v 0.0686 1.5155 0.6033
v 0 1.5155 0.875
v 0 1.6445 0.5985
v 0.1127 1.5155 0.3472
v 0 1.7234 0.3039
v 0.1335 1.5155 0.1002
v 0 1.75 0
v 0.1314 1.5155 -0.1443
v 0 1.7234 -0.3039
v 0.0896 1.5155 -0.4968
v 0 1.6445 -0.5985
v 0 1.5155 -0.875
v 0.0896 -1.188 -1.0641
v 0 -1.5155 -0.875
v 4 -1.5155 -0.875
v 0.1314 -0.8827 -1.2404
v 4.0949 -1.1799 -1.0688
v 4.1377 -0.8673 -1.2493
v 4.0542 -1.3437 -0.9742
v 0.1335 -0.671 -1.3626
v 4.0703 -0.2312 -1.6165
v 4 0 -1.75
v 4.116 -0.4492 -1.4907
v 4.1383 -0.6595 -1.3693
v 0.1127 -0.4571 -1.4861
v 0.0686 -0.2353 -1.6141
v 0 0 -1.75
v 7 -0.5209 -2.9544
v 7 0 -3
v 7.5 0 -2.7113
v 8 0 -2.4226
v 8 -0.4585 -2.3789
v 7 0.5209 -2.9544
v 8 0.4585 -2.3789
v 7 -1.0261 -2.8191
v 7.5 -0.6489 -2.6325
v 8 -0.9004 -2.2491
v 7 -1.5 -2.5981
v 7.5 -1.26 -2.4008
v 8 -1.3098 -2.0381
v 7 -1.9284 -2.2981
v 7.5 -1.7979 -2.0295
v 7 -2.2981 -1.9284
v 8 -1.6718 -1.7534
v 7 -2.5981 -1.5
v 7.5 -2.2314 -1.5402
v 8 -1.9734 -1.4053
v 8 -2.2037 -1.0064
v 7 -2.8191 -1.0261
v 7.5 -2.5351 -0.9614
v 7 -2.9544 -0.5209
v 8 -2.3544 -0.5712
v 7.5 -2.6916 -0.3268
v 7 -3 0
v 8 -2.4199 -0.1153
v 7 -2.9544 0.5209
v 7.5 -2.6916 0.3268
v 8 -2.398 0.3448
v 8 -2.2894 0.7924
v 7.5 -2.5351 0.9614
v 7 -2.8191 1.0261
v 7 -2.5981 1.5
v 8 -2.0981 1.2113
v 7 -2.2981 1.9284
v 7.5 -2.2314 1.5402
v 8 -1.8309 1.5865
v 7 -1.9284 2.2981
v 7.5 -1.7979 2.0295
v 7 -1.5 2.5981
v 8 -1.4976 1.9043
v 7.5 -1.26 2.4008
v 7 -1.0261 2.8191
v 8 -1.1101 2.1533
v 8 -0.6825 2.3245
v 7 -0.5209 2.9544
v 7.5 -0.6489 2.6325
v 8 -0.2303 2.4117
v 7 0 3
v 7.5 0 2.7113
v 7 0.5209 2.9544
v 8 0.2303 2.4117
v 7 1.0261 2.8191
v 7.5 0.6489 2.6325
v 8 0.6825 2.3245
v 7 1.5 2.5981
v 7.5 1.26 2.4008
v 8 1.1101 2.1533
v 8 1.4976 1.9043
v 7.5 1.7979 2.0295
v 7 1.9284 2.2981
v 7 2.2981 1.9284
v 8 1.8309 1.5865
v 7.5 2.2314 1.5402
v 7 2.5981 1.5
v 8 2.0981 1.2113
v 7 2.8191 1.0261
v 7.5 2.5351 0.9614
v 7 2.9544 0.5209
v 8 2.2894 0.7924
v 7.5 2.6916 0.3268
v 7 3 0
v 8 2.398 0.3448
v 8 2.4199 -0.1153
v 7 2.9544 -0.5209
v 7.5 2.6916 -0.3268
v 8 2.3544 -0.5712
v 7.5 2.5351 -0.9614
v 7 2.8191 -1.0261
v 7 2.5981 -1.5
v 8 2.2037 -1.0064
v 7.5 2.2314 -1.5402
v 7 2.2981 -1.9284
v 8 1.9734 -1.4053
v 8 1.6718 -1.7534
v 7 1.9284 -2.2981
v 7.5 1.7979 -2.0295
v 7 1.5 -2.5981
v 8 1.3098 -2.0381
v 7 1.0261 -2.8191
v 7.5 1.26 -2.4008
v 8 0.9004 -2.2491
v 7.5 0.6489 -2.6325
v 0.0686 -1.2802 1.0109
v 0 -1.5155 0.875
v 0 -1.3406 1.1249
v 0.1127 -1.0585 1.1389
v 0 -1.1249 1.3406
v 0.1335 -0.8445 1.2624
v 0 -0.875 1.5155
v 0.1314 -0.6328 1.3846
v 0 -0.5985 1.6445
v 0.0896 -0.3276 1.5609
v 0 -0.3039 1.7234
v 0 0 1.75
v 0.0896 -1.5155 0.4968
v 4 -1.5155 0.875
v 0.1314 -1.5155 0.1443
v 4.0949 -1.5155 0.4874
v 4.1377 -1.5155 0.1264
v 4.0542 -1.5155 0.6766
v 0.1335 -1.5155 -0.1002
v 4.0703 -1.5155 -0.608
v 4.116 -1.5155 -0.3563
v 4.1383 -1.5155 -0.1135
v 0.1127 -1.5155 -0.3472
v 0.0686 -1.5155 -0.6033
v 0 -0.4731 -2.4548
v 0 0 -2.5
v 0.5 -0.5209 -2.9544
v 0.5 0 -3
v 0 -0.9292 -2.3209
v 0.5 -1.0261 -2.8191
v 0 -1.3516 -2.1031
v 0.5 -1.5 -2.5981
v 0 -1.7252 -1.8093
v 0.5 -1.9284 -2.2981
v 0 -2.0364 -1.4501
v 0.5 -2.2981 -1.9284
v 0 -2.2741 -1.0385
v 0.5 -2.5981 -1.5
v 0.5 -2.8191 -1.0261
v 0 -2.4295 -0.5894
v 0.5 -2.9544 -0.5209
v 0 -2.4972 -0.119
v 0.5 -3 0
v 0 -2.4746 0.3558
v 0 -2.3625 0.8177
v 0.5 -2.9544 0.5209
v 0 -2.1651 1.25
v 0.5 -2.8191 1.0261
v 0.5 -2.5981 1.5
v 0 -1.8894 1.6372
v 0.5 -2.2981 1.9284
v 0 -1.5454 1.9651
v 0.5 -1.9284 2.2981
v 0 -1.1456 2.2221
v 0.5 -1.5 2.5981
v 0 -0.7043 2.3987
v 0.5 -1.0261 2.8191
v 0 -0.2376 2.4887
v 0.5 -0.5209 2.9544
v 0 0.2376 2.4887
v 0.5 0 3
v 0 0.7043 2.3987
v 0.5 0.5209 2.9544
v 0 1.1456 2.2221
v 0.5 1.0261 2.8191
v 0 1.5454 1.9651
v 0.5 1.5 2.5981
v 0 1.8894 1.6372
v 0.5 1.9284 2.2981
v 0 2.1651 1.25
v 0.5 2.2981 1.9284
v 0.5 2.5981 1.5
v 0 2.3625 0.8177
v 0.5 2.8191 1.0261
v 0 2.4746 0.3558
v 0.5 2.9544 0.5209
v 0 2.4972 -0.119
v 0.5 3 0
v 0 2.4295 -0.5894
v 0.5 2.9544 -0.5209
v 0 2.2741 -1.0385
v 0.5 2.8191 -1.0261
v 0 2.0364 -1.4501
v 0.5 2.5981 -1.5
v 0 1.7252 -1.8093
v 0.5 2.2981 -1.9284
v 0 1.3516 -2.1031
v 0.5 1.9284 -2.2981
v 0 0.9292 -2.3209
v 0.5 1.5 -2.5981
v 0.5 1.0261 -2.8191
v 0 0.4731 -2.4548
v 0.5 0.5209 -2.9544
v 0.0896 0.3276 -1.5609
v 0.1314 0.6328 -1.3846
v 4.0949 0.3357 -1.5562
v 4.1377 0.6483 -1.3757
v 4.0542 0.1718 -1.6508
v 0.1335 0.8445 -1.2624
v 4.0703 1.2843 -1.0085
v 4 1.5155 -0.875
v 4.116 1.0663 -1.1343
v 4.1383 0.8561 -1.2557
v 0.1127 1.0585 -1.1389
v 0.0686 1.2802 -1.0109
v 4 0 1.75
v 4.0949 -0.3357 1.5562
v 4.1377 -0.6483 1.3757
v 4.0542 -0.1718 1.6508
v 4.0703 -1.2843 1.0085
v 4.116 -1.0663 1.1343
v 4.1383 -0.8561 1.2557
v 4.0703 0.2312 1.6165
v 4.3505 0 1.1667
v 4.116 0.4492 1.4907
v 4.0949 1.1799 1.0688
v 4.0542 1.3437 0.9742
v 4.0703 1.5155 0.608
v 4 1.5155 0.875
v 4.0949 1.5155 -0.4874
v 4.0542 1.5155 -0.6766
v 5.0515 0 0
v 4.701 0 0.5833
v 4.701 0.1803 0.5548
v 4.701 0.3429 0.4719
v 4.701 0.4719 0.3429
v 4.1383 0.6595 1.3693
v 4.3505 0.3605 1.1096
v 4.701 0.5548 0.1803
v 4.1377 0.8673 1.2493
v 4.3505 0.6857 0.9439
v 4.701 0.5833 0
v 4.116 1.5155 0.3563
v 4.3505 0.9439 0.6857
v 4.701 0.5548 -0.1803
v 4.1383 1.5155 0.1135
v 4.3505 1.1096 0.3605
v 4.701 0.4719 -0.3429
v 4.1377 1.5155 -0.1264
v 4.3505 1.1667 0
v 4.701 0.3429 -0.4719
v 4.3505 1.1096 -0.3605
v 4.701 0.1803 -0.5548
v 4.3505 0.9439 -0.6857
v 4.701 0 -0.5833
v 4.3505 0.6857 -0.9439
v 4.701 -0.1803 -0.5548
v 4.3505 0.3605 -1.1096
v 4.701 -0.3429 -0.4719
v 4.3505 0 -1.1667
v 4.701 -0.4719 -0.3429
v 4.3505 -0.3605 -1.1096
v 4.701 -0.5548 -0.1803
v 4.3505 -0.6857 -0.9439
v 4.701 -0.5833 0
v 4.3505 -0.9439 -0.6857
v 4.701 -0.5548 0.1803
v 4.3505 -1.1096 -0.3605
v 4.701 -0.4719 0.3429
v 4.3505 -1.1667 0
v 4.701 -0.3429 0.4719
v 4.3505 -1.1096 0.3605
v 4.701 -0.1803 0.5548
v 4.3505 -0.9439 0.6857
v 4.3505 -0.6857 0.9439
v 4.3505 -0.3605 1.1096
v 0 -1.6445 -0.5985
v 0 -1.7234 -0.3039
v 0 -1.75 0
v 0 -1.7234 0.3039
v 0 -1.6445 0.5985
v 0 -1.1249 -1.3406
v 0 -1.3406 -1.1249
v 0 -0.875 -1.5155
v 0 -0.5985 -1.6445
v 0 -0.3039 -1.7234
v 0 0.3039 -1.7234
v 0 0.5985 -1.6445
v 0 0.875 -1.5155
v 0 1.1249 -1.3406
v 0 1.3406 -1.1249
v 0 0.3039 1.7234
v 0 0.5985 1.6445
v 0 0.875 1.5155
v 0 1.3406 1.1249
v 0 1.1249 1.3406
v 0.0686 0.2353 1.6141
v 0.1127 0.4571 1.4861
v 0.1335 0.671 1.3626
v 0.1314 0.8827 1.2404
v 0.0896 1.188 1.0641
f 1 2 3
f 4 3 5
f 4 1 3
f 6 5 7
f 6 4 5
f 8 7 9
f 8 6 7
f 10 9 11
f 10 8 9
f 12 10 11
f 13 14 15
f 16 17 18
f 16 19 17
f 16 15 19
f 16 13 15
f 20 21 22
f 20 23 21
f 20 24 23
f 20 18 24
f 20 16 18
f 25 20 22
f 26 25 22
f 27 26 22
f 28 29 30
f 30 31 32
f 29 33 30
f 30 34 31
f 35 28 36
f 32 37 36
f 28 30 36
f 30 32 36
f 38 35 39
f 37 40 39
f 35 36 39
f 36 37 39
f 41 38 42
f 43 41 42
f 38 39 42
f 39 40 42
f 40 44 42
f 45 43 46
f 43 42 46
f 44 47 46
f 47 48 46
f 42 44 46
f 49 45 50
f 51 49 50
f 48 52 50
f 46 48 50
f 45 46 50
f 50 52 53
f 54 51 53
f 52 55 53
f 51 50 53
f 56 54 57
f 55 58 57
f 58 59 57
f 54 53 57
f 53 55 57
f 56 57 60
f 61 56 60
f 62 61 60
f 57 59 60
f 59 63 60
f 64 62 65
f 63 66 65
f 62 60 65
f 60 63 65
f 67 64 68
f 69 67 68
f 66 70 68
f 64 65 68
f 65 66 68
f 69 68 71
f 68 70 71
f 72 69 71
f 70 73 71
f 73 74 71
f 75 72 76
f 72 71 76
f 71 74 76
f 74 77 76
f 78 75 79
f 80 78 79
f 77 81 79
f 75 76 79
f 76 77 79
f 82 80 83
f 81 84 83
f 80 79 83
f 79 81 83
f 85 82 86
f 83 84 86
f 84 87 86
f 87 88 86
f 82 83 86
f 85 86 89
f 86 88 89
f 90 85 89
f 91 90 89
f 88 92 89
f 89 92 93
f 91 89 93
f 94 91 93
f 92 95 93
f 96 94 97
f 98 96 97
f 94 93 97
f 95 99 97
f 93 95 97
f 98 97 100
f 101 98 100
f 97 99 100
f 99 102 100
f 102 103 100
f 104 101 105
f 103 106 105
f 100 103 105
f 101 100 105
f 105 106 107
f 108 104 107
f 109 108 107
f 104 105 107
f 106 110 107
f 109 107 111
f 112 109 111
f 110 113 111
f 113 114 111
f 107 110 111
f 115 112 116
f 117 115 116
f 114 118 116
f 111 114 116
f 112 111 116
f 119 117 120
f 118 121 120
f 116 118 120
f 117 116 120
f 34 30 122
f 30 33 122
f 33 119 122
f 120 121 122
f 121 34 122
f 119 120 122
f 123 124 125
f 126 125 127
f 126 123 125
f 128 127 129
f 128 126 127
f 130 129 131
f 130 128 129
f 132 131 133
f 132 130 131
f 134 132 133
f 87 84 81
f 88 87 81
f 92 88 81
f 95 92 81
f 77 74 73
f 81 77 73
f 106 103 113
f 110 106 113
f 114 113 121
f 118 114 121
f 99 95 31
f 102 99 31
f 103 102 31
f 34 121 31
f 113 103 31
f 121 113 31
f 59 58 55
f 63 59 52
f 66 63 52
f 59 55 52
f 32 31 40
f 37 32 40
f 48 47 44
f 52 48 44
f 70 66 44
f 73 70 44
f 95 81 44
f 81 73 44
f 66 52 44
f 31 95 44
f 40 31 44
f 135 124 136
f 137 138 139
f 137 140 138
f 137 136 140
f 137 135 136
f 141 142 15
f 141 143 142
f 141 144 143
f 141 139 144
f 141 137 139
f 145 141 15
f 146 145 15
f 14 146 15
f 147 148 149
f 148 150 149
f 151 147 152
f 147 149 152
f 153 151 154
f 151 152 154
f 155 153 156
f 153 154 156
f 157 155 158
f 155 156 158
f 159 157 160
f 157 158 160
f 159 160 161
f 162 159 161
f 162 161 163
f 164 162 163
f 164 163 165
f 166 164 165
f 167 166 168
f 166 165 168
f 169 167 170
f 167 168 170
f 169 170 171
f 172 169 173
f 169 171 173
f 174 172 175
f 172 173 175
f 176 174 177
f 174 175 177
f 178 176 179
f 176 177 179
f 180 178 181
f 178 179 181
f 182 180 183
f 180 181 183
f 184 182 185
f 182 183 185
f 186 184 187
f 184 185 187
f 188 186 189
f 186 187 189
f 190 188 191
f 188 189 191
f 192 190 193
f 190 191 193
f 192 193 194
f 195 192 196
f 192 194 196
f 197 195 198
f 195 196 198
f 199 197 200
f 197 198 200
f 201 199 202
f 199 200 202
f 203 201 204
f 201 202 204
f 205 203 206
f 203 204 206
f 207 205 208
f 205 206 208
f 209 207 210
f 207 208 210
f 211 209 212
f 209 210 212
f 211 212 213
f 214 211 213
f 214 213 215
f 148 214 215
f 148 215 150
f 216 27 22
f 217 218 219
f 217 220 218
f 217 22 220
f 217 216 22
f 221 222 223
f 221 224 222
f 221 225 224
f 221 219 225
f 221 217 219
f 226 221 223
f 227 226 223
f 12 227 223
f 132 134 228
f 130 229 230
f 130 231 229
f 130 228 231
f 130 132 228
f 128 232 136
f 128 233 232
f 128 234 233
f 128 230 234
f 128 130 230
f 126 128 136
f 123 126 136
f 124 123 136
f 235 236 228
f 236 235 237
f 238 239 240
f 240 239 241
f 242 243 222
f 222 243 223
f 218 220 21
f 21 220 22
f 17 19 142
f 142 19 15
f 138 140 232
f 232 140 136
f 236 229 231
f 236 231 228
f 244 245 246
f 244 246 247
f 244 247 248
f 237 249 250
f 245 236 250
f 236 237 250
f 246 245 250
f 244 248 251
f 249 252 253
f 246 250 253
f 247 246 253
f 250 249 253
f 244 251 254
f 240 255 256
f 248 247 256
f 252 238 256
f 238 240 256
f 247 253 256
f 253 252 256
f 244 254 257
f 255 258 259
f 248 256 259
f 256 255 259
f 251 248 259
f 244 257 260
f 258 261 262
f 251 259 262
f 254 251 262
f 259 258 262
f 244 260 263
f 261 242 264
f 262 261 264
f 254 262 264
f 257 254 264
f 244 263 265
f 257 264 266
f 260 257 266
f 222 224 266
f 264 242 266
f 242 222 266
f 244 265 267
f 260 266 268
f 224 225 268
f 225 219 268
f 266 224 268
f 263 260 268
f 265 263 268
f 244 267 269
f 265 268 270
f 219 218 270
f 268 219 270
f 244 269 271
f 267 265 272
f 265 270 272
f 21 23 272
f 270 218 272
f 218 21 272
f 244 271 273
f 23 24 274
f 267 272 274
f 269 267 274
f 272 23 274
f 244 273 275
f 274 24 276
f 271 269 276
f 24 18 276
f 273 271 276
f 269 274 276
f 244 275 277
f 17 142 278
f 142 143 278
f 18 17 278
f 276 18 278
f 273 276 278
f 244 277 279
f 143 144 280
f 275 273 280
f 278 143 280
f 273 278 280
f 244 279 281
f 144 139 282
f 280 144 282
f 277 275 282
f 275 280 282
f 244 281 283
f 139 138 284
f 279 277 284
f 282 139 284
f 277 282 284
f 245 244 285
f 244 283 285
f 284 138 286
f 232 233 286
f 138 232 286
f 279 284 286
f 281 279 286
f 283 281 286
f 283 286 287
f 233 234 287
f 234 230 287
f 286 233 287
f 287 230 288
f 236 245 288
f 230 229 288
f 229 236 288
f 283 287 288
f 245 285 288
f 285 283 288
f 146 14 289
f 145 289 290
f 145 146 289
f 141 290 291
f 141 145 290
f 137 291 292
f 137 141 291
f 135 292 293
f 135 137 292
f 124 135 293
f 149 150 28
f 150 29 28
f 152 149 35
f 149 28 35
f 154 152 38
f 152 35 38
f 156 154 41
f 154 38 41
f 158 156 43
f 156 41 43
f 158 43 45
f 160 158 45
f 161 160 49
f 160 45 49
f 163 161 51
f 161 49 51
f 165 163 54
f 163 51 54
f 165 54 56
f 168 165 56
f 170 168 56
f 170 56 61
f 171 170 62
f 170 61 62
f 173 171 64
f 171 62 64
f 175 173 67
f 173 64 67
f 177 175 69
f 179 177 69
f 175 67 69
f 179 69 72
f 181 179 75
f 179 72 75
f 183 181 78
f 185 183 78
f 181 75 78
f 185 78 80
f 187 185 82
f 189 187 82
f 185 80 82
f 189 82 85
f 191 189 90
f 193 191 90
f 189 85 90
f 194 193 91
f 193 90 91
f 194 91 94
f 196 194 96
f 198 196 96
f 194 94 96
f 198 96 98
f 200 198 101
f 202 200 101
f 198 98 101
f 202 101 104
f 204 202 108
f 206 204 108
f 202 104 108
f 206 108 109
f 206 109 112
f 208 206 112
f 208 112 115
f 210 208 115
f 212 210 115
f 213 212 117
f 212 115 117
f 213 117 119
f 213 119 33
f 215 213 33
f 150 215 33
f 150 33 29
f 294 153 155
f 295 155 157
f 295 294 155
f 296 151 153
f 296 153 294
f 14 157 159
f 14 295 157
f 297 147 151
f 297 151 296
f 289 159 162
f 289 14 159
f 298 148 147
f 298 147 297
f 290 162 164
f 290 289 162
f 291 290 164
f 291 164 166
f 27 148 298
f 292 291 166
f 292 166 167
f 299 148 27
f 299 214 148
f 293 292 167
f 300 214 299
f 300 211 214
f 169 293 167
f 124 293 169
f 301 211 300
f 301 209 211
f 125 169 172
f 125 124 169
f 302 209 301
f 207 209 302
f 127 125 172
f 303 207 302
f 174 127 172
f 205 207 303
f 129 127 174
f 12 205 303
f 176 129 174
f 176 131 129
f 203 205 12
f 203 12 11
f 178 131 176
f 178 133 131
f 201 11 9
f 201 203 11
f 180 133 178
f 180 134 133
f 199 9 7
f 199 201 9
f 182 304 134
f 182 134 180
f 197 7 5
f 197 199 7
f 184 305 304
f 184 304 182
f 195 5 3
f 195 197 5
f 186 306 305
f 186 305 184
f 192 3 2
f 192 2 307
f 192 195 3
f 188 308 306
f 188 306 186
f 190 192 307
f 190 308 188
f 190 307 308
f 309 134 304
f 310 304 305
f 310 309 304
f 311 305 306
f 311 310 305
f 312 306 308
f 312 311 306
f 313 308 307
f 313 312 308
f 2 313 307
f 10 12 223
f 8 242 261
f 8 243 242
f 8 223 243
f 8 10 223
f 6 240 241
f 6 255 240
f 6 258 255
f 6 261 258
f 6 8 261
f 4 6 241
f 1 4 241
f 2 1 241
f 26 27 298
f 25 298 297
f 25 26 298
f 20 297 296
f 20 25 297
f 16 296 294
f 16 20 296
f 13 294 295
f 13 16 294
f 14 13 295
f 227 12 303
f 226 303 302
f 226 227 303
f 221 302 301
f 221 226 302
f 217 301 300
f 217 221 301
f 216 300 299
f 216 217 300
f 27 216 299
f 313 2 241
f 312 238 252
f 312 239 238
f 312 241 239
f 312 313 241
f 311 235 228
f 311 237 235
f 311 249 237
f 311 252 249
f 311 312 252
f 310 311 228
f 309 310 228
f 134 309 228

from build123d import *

# Parameters (mm, degrees)
D_RA1_D         = 3.5
D_RA1_DEPTH     = 4
D_RA1_TIP       = 1.051506083
VYSUNOUT1_REACH = 11.055


with BuildPart() as part:
    # Skica1 → Otočit kolem osy1 (revolve)
    with BuildSketch(Plane(origin=(0, 0, 0), x_dir=(1, 0, 0), z_dir=(0, 1, 0))):
        Polygon((0, 0), (0, 2.5), (0.5, 3), (7, 3), (8, 2.422649731), (8, 0), align=None)
    revolve(axis=Axis((8, 0, 0), (-1, 0, 0)))

    # Díra1
    with Locations(Plane.ZY):
        with Locations((0, 0)):
            Hole(D_RA1_D / 2, depth=D_RA1_DEPTH)
            with Locations((0, 0, -(D_RA1_DEPTH + D_RA1_TIP / 2))):  # 118° drill point
                Cone(0, D_RA1_D / 2, D_RA1_TIP, mode=Mode.SUBTRACT)

    # Vysunout1: up to this cone (the profile starts inside it)
    vysunout1_end = Plane(origin=(0, 0, 0), z_dir=(-1, 0, 0)).offset(-5.051505083) * Cone(1.664e-06, 41.629661224, 25.013623013, align=(Align.CENTER, Align.CENTER, Align.MIN), mode=Mode.PRIVATE)
    # Skica4 → Vysunout1 (add, up to the surface)
    with BuildSketch(Plane.ZY, mode=Mode.PRIVATE) as vysunout1_sk1:
        with BuildLine():
            Line((-1.75, 0), (-0.875, 1.515544457))
            ThreePointArc((-0.875, 1.515544457), (-1.515544457, 0.875), (-1.75, 0))
        make_face()
    vysunout1_tool1 = extrude(vysunout1_sk1.sketch, amount=-VYSUNOUT1_REACH, mode=Mode.PRIVATE) & vysunout1_end
    add(vysunout1_tool1.solids().sort_by_distance((0, 0.804943, -1.394203))[0])
    # Skica4 → Vysunout1 (add, up to the surface)
    with BuildSketch(Plane.ZY, mode=Mode.PRIVATE) as vysunout1_sk2:
        with BuildLine():
            ThreePointArc((0.875, 1.515544457), (0, 1.75), (-0.875, 1.515544457))
            Line((-0.875, 1.515544457), (0.875, 1.515544457))
        make_face()
    vysunout1_tool2 = extrude(vysunout1_sk2.sketch, amount=-VYSUNOUT1_REACH, mode=Mode.PRIVATE) & vysunout1_end
    add(vysunout1_tool2.solids().sort_by_distance((0, 1.609887, 0))[0])
    # Skica4 → Vysunout1 (add, up to the surface)
    with BuildSketch(Plane.ZY, mode=Mode.PRIVATE) as vysunout1_sk3:
        with BuildLine():
            ThreePointArc((1.75, 0), (1.515544457, 0.875), (0.875, 1.515544457))
            Line((0.875, 1.515544457), (1.75, 0))
        make_face()
    vysunout1_tool3 = extrude(vysunout1_sk3.sketch, amount=-VYSUNOUT1_REACH, mode=Mode.PRIVATE) & vysunout1_end
    add(vysunout1_tool3.solids().sort_by_distance((0, 0.804943, 1.394203))[0])
    # Skica4 → Vysunout1 (add, up to the surface)
    with BuildSketch(Plane.ZY, mode=Mode.PRIVATE) as vysunout1_sk4:
        with BuildLine():
            ThreePointArc((0.875, -1.515544457), (1.515544457, -0.875), (1.75, 0))
            Line((1.75, 0), (0.875, -1.515544457))
        make_face()
    vysunout1_tool4 = extrude(vysunout1_sk4.sketch, amount=-VYSUNOUT1_REACH, mode=Mode.PRIVATE) & vysunout1_end
    add(vysunout1_tool4.solids().sort_by_distance((0, -0.804943, 1.394203))[0])
    # Skica4 → Vysunout1 (add, up to the surface)
    with BuildSketch(Plane.ZY, mode=Mode.PRIVATE) as vysunout1_sk5:
        with BuildLine():
            Line((0.875, -1.515544457), (-0.875, -1.515544457))
            ThreePointArc((-0.875, -1.515544457), (0, -1.75), (0.875, -1.515544457))
        make_face()
    vysunout1_tool5 = extrude(vysunout1_sk5.sketch, amount=-VYSUNOUT1_REACH, mode=Mode.PRIVATE) & vysunout1_end
    add(vysunout1_tool5.solids().sort_by_distance((0, -1.609887, 0))[0])
    # Skica4 → Vysunout1 (add, up to the surface)
    with BuildSketch(Plane.ZY, mode=Mode.PRIVATE) as vysunout1_sk6:
        with BuildLine():
            Line((-0.875, -1.515544457), (-1.75, 0))
            ThreePointArc((-1.75, 0), (-1.515544457, -0.875), (-0.875, -1.515544457))
        make_face()
    vysunout1_tool6 = extrude(vysunout1_sk6.sketch, amount=-VYSUNOUT1_REACH, mode=Mode.PRIVATE) & vysunout1_end
    add(vysunout1_tool6.solids().sort_by_distance((0, -0.804943, -1.394203))[0])

    # Skica5 → Odebrat otočením1 (revolve, cut)
    with BuildSketch(Plane(origin=(0, 0, 0), x_dir=(1, 0, 0), z_dir=(0, 1, 0))):
        Polygon((0, 1.75), (1.010362971, 0), (0, 0), align=None)
    revolve(axis=Axis((1.010362971, 0, 0), (-1, 0, 0)), mode=Mode.SUBTRACT)


solid = part.part
